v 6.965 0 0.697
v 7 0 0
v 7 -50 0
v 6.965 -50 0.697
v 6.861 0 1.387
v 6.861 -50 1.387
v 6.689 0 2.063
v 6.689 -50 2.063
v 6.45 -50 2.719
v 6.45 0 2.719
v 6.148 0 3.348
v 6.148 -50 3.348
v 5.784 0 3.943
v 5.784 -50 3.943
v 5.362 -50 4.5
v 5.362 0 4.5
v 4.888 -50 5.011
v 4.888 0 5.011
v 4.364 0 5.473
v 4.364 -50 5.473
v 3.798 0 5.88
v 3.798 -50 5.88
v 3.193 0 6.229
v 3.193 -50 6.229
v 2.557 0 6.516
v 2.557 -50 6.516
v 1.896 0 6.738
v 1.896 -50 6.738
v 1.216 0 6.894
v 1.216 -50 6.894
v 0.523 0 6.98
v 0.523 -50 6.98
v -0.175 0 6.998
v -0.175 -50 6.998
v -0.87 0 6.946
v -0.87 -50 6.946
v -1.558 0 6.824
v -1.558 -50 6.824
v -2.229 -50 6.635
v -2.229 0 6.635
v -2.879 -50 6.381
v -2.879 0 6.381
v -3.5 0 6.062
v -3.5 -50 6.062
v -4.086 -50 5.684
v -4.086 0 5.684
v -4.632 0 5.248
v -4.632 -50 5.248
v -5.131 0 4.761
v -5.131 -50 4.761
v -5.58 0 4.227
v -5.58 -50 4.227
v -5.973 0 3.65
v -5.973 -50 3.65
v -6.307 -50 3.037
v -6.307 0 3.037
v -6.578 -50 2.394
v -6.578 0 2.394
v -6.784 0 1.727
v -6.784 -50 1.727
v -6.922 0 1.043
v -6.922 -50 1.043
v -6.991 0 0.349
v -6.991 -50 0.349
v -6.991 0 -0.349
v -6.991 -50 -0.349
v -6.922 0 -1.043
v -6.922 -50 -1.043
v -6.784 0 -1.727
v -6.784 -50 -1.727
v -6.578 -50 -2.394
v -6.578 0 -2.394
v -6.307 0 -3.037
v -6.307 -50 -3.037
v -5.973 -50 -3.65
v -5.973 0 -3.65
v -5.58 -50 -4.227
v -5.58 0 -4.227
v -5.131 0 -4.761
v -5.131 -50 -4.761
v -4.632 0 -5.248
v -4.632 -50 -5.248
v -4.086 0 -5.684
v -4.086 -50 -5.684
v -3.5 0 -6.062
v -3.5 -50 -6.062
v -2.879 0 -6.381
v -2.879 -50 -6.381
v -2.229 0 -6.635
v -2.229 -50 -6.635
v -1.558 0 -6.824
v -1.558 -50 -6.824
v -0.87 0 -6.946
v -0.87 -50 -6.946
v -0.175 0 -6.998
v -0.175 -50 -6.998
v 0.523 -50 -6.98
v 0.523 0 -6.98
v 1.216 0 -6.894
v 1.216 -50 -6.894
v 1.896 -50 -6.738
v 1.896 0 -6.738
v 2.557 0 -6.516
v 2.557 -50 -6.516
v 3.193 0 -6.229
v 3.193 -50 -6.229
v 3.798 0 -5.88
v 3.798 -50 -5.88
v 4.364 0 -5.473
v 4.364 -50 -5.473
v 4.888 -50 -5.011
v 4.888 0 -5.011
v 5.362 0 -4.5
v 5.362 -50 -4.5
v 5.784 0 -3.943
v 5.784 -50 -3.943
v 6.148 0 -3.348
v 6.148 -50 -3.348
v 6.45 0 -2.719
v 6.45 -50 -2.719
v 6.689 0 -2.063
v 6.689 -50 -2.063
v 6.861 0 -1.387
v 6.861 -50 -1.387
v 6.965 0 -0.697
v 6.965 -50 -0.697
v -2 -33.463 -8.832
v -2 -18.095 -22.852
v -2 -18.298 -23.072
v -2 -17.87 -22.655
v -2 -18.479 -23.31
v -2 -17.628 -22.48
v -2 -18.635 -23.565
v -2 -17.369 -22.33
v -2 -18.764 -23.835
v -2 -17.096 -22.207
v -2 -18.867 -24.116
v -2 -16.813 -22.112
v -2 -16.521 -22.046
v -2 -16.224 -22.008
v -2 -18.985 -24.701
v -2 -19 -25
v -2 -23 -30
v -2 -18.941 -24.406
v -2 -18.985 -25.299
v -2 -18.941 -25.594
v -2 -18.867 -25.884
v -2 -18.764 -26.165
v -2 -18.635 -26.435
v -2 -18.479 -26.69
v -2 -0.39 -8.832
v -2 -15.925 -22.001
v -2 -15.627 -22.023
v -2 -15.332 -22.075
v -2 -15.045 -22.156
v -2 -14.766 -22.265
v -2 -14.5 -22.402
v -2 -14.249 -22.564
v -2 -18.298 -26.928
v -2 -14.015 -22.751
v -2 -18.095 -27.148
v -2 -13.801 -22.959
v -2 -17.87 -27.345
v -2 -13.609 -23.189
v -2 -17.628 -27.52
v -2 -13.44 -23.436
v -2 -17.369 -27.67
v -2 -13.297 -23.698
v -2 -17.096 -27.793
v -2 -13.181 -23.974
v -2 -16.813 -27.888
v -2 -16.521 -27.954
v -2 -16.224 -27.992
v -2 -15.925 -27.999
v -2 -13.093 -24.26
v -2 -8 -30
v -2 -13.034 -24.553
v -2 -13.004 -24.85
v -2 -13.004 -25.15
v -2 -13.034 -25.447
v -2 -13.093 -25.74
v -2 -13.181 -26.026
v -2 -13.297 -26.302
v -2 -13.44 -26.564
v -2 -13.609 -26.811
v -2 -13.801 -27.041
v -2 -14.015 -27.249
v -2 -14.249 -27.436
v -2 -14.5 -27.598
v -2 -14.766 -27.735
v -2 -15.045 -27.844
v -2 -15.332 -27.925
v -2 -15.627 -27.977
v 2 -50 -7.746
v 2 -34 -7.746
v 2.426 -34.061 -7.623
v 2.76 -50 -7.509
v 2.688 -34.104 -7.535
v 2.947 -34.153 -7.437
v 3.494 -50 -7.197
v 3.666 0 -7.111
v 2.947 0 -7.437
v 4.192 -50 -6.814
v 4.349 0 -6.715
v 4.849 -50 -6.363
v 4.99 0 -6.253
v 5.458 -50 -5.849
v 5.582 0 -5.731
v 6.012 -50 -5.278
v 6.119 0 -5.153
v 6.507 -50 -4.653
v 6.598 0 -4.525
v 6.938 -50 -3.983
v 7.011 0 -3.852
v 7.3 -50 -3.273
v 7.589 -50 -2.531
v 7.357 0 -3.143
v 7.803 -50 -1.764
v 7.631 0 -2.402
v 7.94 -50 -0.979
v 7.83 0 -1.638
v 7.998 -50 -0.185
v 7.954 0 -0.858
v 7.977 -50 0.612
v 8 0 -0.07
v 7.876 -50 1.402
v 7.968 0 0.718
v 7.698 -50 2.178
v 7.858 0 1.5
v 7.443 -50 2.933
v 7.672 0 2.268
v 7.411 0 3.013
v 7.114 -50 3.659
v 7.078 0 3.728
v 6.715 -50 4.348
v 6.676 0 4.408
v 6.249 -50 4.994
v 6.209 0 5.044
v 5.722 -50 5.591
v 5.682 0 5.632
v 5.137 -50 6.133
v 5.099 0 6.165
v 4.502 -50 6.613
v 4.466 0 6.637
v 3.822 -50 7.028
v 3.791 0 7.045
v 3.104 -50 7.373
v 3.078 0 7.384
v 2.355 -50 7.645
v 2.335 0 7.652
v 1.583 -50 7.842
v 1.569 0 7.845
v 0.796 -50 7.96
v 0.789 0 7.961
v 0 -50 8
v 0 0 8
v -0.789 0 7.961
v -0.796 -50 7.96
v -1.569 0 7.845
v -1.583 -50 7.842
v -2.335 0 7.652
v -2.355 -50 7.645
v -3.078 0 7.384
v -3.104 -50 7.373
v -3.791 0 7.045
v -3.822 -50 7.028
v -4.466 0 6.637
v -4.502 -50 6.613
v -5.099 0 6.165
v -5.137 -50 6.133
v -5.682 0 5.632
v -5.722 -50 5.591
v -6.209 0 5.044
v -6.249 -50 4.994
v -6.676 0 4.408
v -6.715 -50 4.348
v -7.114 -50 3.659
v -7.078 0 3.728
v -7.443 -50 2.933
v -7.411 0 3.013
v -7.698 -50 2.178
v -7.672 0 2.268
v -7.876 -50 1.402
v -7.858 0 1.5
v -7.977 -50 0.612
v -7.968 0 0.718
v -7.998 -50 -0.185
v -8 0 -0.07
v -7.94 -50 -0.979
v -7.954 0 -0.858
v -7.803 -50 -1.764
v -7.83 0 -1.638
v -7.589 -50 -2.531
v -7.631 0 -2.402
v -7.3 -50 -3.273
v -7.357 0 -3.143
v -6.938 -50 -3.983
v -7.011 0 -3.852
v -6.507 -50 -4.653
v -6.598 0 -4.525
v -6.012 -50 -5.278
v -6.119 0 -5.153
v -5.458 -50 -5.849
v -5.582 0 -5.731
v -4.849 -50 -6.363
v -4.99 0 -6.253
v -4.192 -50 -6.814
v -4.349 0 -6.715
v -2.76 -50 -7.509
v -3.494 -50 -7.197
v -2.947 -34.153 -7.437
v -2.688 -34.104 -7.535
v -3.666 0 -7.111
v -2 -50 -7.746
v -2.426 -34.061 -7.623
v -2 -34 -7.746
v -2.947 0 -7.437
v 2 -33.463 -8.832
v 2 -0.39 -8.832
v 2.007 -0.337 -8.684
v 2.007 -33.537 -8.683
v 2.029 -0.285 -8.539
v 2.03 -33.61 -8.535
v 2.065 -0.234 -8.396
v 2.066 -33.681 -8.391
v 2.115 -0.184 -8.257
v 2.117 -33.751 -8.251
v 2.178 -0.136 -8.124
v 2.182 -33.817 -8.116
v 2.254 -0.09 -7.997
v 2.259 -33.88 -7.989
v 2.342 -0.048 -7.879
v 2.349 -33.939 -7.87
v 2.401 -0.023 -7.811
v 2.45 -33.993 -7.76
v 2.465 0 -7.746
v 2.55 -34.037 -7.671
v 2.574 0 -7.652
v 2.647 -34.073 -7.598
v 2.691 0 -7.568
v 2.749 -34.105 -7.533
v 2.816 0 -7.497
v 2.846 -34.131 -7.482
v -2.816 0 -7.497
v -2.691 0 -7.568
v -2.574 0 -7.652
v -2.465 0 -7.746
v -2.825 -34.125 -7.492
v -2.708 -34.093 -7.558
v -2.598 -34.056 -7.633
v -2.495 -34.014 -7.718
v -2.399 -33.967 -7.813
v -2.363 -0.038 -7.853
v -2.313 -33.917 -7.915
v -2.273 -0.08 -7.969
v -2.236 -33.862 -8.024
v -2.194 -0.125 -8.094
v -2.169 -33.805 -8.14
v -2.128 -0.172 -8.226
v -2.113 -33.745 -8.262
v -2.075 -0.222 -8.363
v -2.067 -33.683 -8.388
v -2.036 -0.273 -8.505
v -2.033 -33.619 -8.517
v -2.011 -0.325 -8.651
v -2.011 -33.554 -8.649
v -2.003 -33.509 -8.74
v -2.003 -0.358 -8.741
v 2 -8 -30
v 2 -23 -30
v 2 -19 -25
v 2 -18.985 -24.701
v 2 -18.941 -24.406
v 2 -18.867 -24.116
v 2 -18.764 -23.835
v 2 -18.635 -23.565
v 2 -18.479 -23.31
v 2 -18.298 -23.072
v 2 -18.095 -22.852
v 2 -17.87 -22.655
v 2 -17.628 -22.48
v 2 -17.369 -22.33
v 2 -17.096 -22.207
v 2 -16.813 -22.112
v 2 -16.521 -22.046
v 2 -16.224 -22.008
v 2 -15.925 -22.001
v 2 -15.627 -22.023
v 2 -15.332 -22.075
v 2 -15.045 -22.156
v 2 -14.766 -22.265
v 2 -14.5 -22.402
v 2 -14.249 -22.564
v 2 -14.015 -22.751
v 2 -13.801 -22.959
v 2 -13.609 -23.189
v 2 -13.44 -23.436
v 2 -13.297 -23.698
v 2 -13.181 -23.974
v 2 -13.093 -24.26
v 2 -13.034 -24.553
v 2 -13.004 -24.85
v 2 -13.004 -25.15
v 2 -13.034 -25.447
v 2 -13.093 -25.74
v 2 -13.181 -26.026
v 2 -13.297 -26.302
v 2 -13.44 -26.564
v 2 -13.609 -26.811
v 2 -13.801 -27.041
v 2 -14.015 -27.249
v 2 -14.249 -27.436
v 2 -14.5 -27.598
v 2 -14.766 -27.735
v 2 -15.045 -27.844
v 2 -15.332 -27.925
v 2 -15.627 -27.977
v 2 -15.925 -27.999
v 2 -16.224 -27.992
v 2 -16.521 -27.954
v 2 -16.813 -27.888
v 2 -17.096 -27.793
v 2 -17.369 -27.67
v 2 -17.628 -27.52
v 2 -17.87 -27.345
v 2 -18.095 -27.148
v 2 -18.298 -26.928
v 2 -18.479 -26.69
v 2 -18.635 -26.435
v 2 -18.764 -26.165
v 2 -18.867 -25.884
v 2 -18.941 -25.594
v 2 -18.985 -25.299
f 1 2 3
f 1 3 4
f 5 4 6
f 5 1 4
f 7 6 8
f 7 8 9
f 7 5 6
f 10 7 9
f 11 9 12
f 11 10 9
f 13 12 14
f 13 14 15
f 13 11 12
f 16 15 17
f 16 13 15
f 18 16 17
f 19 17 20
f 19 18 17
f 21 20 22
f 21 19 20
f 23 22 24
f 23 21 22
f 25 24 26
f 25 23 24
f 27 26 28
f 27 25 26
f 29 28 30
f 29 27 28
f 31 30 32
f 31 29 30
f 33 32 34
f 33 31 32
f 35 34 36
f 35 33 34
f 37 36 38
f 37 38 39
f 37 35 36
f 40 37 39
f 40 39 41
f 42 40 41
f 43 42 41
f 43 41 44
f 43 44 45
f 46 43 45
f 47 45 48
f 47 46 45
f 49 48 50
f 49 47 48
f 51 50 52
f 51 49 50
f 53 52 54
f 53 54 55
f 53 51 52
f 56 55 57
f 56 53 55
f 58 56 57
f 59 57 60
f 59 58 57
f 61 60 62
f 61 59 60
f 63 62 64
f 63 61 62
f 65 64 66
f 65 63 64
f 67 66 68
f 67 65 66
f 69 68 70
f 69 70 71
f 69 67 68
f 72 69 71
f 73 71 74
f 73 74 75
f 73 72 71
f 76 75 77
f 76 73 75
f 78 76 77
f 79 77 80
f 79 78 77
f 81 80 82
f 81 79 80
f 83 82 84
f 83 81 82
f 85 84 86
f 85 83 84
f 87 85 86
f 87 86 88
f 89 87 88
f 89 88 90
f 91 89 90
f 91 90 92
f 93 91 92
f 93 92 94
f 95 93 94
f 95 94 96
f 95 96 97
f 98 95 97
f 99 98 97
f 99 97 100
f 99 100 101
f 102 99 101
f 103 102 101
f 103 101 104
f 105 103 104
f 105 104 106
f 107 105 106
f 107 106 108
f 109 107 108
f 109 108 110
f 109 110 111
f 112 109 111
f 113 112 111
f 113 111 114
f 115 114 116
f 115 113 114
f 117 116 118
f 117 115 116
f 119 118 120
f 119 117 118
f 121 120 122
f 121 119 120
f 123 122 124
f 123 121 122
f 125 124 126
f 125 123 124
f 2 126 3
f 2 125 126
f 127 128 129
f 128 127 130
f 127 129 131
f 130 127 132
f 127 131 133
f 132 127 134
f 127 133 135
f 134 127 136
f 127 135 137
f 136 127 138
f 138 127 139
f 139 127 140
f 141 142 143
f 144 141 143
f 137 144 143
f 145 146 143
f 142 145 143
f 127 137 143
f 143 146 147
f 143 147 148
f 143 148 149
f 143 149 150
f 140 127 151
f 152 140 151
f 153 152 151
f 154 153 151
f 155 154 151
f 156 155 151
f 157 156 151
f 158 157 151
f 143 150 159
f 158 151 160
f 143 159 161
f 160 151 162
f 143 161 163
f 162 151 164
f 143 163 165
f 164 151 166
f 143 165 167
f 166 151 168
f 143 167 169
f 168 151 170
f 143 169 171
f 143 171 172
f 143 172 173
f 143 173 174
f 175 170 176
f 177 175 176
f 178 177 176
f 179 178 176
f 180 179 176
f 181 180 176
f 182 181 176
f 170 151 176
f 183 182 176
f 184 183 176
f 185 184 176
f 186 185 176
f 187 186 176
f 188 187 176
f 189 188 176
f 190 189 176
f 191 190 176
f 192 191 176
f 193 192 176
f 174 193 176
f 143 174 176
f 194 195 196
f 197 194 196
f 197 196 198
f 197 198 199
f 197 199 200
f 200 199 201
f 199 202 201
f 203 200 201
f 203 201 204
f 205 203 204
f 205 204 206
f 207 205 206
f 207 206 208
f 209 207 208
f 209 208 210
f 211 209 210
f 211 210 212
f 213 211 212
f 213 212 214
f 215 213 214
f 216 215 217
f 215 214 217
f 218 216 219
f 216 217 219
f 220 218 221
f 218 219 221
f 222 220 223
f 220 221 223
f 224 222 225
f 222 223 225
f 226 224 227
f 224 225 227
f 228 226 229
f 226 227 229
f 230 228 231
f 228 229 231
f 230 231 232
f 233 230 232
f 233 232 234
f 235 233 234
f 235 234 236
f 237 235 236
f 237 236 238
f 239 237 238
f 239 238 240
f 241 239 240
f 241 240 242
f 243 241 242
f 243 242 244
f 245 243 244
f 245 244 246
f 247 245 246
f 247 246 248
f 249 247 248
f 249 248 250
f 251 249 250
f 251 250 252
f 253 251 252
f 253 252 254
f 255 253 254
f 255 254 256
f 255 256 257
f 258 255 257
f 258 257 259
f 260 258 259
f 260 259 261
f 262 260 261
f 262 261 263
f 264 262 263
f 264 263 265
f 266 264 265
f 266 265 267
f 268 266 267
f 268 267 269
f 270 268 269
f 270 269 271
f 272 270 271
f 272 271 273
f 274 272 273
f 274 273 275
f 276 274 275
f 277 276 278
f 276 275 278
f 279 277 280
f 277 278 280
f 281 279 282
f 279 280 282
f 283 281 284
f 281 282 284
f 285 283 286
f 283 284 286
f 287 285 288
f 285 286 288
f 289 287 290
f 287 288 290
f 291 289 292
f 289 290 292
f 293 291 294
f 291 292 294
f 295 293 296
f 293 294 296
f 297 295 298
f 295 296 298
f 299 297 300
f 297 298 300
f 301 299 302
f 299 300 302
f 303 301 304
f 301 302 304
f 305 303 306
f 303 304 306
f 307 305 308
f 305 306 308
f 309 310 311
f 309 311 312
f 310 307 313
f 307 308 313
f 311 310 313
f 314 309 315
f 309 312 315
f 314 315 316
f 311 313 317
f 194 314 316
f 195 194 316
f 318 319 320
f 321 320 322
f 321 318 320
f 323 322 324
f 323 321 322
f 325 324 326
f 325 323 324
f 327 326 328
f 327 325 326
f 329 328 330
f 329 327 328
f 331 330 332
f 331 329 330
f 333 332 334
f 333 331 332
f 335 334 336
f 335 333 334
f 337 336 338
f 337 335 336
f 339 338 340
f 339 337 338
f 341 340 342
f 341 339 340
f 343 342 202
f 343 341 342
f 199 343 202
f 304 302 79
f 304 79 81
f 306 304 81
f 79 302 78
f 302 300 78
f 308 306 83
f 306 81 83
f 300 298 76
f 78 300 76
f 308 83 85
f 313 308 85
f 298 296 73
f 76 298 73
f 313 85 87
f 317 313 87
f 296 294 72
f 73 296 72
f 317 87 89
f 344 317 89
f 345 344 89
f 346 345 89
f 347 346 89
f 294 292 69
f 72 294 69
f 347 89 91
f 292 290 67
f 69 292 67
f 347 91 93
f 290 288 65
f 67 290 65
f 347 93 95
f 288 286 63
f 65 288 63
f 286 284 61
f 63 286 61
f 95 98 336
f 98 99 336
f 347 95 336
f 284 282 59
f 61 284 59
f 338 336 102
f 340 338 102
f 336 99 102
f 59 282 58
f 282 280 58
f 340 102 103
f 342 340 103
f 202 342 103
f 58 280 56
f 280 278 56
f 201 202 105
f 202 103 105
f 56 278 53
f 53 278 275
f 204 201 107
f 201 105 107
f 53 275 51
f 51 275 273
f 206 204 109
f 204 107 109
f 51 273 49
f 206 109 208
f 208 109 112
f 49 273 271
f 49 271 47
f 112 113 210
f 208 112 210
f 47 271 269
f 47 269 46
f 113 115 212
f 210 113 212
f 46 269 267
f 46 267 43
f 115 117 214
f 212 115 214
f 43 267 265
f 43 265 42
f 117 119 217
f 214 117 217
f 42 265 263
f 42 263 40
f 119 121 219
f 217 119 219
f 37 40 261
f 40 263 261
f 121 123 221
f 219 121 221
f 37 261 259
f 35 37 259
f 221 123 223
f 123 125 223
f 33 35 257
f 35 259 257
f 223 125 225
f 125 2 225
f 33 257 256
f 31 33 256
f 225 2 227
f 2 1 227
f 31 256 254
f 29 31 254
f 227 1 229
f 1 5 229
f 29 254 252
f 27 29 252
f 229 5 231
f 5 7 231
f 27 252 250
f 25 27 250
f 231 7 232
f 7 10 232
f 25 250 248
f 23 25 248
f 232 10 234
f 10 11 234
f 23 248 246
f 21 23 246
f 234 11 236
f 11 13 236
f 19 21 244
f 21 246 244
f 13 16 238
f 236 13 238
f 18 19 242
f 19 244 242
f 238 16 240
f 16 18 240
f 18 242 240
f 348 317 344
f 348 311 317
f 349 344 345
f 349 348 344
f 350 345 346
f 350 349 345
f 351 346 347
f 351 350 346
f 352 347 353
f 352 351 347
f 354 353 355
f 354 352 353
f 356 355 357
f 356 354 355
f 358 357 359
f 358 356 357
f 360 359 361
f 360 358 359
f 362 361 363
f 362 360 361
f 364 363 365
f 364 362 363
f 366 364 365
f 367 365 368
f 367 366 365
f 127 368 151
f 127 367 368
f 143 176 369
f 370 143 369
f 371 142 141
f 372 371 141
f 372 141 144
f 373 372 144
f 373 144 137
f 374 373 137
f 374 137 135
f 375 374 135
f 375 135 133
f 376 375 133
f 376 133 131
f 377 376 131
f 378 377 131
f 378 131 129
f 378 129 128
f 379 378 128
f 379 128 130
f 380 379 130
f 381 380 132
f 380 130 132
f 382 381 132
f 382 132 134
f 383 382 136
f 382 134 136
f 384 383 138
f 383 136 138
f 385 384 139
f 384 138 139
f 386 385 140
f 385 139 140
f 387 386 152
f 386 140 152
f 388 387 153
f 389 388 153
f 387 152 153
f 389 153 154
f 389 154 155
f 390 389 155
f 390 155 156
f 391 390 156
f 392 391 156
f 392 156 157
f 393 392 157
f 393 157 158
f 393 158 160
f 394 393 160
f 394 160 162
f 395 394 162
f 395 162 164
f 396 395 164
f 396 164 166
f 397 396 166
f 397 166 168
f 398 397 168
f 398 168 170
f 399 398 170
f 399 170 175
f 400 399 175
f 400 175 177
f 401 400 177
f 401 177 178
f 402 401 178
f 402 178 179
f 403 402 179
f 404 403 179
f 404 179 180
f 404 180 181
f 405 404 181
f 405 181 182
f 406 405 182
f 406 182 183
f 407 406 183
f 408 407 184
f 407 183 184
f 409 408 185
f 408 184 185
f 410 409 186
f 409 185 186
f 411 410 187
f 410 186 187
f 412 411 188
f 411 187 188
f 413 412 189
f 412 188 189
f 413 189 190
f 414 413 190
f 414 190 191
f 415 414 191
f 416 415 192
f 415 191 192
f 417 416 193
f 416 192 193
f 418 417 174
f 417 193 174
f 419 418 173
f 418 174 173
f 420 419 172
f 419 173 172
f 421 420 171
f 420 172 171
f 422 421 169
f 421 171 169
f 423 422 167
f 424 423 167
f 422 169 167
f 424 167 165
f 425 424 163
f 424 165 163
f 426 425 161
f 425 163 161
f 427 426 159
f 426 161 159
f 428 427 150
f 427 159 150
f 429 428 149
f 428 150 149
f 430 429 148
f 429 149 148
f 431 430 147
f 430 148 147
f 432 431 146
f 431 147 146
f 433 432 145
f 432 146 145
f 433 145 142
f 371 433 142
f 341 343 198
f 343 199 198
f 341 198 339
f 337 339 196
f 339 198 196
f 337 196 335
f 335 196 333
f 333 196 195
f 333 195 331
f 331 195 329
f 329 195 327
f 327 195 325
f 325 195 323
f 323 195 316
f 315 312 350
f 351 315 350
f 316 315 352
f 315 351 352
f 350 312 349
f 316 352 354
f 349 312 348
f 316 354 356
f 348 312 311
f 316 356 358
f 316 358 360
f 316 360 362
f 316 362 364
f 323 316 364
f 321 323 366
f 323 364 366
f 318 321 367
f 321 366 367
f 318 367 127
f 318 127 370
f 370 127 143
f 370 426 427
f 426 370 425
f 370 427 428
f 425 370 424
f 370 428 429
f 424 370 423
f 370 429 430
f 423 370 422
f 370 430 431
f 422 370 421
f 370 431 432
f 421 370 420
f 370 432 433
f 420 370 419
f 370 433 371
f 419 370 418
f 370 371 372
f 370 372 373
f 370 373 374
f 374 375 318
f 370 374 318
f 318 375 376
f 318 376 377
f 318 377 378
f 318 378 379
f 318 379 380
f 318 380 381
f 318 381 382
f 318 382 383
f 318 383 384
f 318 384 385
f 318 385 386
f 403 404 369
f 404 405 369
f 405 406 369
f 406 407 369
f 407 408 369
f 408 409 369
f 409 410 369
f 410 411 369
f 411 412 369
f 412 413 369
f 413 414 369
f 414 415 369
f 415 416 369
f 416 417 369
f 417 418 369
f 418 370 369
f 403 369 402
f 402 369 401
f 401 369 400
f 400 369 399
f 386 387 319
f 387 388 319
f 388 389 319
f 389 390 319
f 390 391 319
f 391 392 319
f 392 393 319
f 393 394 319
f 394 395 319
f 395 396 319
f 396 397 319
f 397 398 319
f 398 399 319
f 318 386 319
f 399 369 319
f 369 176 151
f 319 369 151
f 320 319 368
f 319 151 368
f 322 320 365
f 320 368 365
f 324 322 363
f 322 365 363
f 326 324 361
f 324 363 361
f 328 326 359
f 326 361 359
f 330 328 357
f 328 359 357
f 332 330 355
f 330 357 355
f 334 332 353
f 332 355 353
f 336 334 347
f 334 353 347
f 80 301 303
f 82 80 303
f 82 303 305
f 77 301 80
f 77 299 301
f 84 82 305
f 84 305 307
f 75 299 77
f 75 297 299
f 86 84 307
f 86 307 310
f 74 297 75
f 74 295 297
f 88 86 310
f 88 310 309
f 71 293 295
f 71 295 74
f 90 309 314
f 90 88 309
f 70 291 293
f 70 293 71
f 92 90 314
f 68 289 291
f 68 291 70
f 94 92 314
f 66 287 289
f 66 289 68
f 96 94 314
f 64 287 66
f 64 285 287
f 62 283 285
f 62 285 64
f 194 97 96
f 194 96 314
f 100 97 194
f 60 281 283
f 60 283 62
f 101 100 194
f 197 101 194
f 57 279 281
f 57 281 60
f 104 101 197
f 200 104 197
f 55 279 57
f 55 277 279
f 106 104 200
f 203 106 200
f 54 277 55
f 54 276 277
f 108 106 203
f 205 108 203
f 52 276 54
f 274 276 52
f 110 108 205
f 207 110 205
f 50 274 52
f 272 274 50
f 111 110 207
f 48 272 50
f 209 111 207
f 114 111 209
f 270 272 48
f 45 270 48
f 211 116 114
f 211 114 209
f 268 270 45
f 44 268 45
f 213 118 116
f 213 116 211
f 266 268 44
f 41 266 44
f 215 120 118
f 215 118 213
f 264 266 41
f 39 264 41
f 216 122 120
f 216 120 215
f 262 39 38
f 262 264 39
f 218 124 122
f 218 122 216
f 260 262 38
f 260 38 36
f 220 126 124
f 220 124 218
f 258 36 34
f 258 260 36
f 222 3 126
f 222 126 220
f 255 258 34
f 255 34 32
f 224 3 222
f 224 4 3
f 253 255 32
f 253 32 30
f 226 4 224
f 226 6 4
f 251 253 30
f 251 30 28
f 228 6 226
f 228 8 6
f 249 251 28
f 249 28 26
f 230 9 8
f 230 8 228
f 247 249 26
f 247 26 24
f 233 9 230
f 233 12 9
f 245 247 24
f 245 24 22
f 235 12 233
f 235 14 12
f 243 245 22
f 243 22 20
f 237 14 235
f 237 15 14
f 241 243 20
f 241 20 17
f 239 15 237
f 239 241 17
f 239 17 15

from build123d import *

# Parameters (mm, degrees)
F0_R     = 7
F1_DEPTH = 50
F3_R     = 3
F4_DEPTH = 25
F5_R     = 1.5


with BuildPart() as f1:
    # F0 (on Front) → F1 (new body)
    with BuildSketch(Plane.XZ):
        with BuildLine():
            Line((2, -30), (2, -7.7459666924))
            ThreePointArc((2, -7.7459666924), (0, 8), (-2, -7.7459666924))
            Line((-2, -7.7459666924), (-2, -30))
            Line((-2, -30), (0, -30))
            Line((0, -30), (2, -30))
        make_face()
        Circle(F0_R, mode=Mode.SUBTRACT)
    extrude(amount=F1_DEPTH)

    # F3 (on face) → F4 (cut)
    with BuildSketch(Plane(origin=(-2, 0, 0), x_dir=(0, -1, 0), z_dir=(-1, 0, 0))):
        Polygon((50, -7.7459666924), (34, -7.7459666924), (23, -30), (50, -30), align=None)
        Polygon((8, -30), (0, -7.7459666924), (0, -30), align=None)
        with Locations((16, -25)):
            Circle(F3_R)
    extrude(amount=-F4_DEPTH, mode=Mode.SUBTRACT)

    # F5 (call 1 of 2: OpenCascade refuses the feature's edges together)
    f5_edges = [f1.edges().sort_by_distance(p)[0] for p in [
        (-2, -17, -7.745967),
    ]]
    fillet(f5_edges, radius=F5_R)

    # F5#2 (call 2 of 2)
    f5_2_edges = [f1.edges().sort_by_distance(p)[0] for p in [
        (2, -17, -7.745967),
    ]]
    fillet(f5_2_edges, radius=F5_R)


solid = f1.part
